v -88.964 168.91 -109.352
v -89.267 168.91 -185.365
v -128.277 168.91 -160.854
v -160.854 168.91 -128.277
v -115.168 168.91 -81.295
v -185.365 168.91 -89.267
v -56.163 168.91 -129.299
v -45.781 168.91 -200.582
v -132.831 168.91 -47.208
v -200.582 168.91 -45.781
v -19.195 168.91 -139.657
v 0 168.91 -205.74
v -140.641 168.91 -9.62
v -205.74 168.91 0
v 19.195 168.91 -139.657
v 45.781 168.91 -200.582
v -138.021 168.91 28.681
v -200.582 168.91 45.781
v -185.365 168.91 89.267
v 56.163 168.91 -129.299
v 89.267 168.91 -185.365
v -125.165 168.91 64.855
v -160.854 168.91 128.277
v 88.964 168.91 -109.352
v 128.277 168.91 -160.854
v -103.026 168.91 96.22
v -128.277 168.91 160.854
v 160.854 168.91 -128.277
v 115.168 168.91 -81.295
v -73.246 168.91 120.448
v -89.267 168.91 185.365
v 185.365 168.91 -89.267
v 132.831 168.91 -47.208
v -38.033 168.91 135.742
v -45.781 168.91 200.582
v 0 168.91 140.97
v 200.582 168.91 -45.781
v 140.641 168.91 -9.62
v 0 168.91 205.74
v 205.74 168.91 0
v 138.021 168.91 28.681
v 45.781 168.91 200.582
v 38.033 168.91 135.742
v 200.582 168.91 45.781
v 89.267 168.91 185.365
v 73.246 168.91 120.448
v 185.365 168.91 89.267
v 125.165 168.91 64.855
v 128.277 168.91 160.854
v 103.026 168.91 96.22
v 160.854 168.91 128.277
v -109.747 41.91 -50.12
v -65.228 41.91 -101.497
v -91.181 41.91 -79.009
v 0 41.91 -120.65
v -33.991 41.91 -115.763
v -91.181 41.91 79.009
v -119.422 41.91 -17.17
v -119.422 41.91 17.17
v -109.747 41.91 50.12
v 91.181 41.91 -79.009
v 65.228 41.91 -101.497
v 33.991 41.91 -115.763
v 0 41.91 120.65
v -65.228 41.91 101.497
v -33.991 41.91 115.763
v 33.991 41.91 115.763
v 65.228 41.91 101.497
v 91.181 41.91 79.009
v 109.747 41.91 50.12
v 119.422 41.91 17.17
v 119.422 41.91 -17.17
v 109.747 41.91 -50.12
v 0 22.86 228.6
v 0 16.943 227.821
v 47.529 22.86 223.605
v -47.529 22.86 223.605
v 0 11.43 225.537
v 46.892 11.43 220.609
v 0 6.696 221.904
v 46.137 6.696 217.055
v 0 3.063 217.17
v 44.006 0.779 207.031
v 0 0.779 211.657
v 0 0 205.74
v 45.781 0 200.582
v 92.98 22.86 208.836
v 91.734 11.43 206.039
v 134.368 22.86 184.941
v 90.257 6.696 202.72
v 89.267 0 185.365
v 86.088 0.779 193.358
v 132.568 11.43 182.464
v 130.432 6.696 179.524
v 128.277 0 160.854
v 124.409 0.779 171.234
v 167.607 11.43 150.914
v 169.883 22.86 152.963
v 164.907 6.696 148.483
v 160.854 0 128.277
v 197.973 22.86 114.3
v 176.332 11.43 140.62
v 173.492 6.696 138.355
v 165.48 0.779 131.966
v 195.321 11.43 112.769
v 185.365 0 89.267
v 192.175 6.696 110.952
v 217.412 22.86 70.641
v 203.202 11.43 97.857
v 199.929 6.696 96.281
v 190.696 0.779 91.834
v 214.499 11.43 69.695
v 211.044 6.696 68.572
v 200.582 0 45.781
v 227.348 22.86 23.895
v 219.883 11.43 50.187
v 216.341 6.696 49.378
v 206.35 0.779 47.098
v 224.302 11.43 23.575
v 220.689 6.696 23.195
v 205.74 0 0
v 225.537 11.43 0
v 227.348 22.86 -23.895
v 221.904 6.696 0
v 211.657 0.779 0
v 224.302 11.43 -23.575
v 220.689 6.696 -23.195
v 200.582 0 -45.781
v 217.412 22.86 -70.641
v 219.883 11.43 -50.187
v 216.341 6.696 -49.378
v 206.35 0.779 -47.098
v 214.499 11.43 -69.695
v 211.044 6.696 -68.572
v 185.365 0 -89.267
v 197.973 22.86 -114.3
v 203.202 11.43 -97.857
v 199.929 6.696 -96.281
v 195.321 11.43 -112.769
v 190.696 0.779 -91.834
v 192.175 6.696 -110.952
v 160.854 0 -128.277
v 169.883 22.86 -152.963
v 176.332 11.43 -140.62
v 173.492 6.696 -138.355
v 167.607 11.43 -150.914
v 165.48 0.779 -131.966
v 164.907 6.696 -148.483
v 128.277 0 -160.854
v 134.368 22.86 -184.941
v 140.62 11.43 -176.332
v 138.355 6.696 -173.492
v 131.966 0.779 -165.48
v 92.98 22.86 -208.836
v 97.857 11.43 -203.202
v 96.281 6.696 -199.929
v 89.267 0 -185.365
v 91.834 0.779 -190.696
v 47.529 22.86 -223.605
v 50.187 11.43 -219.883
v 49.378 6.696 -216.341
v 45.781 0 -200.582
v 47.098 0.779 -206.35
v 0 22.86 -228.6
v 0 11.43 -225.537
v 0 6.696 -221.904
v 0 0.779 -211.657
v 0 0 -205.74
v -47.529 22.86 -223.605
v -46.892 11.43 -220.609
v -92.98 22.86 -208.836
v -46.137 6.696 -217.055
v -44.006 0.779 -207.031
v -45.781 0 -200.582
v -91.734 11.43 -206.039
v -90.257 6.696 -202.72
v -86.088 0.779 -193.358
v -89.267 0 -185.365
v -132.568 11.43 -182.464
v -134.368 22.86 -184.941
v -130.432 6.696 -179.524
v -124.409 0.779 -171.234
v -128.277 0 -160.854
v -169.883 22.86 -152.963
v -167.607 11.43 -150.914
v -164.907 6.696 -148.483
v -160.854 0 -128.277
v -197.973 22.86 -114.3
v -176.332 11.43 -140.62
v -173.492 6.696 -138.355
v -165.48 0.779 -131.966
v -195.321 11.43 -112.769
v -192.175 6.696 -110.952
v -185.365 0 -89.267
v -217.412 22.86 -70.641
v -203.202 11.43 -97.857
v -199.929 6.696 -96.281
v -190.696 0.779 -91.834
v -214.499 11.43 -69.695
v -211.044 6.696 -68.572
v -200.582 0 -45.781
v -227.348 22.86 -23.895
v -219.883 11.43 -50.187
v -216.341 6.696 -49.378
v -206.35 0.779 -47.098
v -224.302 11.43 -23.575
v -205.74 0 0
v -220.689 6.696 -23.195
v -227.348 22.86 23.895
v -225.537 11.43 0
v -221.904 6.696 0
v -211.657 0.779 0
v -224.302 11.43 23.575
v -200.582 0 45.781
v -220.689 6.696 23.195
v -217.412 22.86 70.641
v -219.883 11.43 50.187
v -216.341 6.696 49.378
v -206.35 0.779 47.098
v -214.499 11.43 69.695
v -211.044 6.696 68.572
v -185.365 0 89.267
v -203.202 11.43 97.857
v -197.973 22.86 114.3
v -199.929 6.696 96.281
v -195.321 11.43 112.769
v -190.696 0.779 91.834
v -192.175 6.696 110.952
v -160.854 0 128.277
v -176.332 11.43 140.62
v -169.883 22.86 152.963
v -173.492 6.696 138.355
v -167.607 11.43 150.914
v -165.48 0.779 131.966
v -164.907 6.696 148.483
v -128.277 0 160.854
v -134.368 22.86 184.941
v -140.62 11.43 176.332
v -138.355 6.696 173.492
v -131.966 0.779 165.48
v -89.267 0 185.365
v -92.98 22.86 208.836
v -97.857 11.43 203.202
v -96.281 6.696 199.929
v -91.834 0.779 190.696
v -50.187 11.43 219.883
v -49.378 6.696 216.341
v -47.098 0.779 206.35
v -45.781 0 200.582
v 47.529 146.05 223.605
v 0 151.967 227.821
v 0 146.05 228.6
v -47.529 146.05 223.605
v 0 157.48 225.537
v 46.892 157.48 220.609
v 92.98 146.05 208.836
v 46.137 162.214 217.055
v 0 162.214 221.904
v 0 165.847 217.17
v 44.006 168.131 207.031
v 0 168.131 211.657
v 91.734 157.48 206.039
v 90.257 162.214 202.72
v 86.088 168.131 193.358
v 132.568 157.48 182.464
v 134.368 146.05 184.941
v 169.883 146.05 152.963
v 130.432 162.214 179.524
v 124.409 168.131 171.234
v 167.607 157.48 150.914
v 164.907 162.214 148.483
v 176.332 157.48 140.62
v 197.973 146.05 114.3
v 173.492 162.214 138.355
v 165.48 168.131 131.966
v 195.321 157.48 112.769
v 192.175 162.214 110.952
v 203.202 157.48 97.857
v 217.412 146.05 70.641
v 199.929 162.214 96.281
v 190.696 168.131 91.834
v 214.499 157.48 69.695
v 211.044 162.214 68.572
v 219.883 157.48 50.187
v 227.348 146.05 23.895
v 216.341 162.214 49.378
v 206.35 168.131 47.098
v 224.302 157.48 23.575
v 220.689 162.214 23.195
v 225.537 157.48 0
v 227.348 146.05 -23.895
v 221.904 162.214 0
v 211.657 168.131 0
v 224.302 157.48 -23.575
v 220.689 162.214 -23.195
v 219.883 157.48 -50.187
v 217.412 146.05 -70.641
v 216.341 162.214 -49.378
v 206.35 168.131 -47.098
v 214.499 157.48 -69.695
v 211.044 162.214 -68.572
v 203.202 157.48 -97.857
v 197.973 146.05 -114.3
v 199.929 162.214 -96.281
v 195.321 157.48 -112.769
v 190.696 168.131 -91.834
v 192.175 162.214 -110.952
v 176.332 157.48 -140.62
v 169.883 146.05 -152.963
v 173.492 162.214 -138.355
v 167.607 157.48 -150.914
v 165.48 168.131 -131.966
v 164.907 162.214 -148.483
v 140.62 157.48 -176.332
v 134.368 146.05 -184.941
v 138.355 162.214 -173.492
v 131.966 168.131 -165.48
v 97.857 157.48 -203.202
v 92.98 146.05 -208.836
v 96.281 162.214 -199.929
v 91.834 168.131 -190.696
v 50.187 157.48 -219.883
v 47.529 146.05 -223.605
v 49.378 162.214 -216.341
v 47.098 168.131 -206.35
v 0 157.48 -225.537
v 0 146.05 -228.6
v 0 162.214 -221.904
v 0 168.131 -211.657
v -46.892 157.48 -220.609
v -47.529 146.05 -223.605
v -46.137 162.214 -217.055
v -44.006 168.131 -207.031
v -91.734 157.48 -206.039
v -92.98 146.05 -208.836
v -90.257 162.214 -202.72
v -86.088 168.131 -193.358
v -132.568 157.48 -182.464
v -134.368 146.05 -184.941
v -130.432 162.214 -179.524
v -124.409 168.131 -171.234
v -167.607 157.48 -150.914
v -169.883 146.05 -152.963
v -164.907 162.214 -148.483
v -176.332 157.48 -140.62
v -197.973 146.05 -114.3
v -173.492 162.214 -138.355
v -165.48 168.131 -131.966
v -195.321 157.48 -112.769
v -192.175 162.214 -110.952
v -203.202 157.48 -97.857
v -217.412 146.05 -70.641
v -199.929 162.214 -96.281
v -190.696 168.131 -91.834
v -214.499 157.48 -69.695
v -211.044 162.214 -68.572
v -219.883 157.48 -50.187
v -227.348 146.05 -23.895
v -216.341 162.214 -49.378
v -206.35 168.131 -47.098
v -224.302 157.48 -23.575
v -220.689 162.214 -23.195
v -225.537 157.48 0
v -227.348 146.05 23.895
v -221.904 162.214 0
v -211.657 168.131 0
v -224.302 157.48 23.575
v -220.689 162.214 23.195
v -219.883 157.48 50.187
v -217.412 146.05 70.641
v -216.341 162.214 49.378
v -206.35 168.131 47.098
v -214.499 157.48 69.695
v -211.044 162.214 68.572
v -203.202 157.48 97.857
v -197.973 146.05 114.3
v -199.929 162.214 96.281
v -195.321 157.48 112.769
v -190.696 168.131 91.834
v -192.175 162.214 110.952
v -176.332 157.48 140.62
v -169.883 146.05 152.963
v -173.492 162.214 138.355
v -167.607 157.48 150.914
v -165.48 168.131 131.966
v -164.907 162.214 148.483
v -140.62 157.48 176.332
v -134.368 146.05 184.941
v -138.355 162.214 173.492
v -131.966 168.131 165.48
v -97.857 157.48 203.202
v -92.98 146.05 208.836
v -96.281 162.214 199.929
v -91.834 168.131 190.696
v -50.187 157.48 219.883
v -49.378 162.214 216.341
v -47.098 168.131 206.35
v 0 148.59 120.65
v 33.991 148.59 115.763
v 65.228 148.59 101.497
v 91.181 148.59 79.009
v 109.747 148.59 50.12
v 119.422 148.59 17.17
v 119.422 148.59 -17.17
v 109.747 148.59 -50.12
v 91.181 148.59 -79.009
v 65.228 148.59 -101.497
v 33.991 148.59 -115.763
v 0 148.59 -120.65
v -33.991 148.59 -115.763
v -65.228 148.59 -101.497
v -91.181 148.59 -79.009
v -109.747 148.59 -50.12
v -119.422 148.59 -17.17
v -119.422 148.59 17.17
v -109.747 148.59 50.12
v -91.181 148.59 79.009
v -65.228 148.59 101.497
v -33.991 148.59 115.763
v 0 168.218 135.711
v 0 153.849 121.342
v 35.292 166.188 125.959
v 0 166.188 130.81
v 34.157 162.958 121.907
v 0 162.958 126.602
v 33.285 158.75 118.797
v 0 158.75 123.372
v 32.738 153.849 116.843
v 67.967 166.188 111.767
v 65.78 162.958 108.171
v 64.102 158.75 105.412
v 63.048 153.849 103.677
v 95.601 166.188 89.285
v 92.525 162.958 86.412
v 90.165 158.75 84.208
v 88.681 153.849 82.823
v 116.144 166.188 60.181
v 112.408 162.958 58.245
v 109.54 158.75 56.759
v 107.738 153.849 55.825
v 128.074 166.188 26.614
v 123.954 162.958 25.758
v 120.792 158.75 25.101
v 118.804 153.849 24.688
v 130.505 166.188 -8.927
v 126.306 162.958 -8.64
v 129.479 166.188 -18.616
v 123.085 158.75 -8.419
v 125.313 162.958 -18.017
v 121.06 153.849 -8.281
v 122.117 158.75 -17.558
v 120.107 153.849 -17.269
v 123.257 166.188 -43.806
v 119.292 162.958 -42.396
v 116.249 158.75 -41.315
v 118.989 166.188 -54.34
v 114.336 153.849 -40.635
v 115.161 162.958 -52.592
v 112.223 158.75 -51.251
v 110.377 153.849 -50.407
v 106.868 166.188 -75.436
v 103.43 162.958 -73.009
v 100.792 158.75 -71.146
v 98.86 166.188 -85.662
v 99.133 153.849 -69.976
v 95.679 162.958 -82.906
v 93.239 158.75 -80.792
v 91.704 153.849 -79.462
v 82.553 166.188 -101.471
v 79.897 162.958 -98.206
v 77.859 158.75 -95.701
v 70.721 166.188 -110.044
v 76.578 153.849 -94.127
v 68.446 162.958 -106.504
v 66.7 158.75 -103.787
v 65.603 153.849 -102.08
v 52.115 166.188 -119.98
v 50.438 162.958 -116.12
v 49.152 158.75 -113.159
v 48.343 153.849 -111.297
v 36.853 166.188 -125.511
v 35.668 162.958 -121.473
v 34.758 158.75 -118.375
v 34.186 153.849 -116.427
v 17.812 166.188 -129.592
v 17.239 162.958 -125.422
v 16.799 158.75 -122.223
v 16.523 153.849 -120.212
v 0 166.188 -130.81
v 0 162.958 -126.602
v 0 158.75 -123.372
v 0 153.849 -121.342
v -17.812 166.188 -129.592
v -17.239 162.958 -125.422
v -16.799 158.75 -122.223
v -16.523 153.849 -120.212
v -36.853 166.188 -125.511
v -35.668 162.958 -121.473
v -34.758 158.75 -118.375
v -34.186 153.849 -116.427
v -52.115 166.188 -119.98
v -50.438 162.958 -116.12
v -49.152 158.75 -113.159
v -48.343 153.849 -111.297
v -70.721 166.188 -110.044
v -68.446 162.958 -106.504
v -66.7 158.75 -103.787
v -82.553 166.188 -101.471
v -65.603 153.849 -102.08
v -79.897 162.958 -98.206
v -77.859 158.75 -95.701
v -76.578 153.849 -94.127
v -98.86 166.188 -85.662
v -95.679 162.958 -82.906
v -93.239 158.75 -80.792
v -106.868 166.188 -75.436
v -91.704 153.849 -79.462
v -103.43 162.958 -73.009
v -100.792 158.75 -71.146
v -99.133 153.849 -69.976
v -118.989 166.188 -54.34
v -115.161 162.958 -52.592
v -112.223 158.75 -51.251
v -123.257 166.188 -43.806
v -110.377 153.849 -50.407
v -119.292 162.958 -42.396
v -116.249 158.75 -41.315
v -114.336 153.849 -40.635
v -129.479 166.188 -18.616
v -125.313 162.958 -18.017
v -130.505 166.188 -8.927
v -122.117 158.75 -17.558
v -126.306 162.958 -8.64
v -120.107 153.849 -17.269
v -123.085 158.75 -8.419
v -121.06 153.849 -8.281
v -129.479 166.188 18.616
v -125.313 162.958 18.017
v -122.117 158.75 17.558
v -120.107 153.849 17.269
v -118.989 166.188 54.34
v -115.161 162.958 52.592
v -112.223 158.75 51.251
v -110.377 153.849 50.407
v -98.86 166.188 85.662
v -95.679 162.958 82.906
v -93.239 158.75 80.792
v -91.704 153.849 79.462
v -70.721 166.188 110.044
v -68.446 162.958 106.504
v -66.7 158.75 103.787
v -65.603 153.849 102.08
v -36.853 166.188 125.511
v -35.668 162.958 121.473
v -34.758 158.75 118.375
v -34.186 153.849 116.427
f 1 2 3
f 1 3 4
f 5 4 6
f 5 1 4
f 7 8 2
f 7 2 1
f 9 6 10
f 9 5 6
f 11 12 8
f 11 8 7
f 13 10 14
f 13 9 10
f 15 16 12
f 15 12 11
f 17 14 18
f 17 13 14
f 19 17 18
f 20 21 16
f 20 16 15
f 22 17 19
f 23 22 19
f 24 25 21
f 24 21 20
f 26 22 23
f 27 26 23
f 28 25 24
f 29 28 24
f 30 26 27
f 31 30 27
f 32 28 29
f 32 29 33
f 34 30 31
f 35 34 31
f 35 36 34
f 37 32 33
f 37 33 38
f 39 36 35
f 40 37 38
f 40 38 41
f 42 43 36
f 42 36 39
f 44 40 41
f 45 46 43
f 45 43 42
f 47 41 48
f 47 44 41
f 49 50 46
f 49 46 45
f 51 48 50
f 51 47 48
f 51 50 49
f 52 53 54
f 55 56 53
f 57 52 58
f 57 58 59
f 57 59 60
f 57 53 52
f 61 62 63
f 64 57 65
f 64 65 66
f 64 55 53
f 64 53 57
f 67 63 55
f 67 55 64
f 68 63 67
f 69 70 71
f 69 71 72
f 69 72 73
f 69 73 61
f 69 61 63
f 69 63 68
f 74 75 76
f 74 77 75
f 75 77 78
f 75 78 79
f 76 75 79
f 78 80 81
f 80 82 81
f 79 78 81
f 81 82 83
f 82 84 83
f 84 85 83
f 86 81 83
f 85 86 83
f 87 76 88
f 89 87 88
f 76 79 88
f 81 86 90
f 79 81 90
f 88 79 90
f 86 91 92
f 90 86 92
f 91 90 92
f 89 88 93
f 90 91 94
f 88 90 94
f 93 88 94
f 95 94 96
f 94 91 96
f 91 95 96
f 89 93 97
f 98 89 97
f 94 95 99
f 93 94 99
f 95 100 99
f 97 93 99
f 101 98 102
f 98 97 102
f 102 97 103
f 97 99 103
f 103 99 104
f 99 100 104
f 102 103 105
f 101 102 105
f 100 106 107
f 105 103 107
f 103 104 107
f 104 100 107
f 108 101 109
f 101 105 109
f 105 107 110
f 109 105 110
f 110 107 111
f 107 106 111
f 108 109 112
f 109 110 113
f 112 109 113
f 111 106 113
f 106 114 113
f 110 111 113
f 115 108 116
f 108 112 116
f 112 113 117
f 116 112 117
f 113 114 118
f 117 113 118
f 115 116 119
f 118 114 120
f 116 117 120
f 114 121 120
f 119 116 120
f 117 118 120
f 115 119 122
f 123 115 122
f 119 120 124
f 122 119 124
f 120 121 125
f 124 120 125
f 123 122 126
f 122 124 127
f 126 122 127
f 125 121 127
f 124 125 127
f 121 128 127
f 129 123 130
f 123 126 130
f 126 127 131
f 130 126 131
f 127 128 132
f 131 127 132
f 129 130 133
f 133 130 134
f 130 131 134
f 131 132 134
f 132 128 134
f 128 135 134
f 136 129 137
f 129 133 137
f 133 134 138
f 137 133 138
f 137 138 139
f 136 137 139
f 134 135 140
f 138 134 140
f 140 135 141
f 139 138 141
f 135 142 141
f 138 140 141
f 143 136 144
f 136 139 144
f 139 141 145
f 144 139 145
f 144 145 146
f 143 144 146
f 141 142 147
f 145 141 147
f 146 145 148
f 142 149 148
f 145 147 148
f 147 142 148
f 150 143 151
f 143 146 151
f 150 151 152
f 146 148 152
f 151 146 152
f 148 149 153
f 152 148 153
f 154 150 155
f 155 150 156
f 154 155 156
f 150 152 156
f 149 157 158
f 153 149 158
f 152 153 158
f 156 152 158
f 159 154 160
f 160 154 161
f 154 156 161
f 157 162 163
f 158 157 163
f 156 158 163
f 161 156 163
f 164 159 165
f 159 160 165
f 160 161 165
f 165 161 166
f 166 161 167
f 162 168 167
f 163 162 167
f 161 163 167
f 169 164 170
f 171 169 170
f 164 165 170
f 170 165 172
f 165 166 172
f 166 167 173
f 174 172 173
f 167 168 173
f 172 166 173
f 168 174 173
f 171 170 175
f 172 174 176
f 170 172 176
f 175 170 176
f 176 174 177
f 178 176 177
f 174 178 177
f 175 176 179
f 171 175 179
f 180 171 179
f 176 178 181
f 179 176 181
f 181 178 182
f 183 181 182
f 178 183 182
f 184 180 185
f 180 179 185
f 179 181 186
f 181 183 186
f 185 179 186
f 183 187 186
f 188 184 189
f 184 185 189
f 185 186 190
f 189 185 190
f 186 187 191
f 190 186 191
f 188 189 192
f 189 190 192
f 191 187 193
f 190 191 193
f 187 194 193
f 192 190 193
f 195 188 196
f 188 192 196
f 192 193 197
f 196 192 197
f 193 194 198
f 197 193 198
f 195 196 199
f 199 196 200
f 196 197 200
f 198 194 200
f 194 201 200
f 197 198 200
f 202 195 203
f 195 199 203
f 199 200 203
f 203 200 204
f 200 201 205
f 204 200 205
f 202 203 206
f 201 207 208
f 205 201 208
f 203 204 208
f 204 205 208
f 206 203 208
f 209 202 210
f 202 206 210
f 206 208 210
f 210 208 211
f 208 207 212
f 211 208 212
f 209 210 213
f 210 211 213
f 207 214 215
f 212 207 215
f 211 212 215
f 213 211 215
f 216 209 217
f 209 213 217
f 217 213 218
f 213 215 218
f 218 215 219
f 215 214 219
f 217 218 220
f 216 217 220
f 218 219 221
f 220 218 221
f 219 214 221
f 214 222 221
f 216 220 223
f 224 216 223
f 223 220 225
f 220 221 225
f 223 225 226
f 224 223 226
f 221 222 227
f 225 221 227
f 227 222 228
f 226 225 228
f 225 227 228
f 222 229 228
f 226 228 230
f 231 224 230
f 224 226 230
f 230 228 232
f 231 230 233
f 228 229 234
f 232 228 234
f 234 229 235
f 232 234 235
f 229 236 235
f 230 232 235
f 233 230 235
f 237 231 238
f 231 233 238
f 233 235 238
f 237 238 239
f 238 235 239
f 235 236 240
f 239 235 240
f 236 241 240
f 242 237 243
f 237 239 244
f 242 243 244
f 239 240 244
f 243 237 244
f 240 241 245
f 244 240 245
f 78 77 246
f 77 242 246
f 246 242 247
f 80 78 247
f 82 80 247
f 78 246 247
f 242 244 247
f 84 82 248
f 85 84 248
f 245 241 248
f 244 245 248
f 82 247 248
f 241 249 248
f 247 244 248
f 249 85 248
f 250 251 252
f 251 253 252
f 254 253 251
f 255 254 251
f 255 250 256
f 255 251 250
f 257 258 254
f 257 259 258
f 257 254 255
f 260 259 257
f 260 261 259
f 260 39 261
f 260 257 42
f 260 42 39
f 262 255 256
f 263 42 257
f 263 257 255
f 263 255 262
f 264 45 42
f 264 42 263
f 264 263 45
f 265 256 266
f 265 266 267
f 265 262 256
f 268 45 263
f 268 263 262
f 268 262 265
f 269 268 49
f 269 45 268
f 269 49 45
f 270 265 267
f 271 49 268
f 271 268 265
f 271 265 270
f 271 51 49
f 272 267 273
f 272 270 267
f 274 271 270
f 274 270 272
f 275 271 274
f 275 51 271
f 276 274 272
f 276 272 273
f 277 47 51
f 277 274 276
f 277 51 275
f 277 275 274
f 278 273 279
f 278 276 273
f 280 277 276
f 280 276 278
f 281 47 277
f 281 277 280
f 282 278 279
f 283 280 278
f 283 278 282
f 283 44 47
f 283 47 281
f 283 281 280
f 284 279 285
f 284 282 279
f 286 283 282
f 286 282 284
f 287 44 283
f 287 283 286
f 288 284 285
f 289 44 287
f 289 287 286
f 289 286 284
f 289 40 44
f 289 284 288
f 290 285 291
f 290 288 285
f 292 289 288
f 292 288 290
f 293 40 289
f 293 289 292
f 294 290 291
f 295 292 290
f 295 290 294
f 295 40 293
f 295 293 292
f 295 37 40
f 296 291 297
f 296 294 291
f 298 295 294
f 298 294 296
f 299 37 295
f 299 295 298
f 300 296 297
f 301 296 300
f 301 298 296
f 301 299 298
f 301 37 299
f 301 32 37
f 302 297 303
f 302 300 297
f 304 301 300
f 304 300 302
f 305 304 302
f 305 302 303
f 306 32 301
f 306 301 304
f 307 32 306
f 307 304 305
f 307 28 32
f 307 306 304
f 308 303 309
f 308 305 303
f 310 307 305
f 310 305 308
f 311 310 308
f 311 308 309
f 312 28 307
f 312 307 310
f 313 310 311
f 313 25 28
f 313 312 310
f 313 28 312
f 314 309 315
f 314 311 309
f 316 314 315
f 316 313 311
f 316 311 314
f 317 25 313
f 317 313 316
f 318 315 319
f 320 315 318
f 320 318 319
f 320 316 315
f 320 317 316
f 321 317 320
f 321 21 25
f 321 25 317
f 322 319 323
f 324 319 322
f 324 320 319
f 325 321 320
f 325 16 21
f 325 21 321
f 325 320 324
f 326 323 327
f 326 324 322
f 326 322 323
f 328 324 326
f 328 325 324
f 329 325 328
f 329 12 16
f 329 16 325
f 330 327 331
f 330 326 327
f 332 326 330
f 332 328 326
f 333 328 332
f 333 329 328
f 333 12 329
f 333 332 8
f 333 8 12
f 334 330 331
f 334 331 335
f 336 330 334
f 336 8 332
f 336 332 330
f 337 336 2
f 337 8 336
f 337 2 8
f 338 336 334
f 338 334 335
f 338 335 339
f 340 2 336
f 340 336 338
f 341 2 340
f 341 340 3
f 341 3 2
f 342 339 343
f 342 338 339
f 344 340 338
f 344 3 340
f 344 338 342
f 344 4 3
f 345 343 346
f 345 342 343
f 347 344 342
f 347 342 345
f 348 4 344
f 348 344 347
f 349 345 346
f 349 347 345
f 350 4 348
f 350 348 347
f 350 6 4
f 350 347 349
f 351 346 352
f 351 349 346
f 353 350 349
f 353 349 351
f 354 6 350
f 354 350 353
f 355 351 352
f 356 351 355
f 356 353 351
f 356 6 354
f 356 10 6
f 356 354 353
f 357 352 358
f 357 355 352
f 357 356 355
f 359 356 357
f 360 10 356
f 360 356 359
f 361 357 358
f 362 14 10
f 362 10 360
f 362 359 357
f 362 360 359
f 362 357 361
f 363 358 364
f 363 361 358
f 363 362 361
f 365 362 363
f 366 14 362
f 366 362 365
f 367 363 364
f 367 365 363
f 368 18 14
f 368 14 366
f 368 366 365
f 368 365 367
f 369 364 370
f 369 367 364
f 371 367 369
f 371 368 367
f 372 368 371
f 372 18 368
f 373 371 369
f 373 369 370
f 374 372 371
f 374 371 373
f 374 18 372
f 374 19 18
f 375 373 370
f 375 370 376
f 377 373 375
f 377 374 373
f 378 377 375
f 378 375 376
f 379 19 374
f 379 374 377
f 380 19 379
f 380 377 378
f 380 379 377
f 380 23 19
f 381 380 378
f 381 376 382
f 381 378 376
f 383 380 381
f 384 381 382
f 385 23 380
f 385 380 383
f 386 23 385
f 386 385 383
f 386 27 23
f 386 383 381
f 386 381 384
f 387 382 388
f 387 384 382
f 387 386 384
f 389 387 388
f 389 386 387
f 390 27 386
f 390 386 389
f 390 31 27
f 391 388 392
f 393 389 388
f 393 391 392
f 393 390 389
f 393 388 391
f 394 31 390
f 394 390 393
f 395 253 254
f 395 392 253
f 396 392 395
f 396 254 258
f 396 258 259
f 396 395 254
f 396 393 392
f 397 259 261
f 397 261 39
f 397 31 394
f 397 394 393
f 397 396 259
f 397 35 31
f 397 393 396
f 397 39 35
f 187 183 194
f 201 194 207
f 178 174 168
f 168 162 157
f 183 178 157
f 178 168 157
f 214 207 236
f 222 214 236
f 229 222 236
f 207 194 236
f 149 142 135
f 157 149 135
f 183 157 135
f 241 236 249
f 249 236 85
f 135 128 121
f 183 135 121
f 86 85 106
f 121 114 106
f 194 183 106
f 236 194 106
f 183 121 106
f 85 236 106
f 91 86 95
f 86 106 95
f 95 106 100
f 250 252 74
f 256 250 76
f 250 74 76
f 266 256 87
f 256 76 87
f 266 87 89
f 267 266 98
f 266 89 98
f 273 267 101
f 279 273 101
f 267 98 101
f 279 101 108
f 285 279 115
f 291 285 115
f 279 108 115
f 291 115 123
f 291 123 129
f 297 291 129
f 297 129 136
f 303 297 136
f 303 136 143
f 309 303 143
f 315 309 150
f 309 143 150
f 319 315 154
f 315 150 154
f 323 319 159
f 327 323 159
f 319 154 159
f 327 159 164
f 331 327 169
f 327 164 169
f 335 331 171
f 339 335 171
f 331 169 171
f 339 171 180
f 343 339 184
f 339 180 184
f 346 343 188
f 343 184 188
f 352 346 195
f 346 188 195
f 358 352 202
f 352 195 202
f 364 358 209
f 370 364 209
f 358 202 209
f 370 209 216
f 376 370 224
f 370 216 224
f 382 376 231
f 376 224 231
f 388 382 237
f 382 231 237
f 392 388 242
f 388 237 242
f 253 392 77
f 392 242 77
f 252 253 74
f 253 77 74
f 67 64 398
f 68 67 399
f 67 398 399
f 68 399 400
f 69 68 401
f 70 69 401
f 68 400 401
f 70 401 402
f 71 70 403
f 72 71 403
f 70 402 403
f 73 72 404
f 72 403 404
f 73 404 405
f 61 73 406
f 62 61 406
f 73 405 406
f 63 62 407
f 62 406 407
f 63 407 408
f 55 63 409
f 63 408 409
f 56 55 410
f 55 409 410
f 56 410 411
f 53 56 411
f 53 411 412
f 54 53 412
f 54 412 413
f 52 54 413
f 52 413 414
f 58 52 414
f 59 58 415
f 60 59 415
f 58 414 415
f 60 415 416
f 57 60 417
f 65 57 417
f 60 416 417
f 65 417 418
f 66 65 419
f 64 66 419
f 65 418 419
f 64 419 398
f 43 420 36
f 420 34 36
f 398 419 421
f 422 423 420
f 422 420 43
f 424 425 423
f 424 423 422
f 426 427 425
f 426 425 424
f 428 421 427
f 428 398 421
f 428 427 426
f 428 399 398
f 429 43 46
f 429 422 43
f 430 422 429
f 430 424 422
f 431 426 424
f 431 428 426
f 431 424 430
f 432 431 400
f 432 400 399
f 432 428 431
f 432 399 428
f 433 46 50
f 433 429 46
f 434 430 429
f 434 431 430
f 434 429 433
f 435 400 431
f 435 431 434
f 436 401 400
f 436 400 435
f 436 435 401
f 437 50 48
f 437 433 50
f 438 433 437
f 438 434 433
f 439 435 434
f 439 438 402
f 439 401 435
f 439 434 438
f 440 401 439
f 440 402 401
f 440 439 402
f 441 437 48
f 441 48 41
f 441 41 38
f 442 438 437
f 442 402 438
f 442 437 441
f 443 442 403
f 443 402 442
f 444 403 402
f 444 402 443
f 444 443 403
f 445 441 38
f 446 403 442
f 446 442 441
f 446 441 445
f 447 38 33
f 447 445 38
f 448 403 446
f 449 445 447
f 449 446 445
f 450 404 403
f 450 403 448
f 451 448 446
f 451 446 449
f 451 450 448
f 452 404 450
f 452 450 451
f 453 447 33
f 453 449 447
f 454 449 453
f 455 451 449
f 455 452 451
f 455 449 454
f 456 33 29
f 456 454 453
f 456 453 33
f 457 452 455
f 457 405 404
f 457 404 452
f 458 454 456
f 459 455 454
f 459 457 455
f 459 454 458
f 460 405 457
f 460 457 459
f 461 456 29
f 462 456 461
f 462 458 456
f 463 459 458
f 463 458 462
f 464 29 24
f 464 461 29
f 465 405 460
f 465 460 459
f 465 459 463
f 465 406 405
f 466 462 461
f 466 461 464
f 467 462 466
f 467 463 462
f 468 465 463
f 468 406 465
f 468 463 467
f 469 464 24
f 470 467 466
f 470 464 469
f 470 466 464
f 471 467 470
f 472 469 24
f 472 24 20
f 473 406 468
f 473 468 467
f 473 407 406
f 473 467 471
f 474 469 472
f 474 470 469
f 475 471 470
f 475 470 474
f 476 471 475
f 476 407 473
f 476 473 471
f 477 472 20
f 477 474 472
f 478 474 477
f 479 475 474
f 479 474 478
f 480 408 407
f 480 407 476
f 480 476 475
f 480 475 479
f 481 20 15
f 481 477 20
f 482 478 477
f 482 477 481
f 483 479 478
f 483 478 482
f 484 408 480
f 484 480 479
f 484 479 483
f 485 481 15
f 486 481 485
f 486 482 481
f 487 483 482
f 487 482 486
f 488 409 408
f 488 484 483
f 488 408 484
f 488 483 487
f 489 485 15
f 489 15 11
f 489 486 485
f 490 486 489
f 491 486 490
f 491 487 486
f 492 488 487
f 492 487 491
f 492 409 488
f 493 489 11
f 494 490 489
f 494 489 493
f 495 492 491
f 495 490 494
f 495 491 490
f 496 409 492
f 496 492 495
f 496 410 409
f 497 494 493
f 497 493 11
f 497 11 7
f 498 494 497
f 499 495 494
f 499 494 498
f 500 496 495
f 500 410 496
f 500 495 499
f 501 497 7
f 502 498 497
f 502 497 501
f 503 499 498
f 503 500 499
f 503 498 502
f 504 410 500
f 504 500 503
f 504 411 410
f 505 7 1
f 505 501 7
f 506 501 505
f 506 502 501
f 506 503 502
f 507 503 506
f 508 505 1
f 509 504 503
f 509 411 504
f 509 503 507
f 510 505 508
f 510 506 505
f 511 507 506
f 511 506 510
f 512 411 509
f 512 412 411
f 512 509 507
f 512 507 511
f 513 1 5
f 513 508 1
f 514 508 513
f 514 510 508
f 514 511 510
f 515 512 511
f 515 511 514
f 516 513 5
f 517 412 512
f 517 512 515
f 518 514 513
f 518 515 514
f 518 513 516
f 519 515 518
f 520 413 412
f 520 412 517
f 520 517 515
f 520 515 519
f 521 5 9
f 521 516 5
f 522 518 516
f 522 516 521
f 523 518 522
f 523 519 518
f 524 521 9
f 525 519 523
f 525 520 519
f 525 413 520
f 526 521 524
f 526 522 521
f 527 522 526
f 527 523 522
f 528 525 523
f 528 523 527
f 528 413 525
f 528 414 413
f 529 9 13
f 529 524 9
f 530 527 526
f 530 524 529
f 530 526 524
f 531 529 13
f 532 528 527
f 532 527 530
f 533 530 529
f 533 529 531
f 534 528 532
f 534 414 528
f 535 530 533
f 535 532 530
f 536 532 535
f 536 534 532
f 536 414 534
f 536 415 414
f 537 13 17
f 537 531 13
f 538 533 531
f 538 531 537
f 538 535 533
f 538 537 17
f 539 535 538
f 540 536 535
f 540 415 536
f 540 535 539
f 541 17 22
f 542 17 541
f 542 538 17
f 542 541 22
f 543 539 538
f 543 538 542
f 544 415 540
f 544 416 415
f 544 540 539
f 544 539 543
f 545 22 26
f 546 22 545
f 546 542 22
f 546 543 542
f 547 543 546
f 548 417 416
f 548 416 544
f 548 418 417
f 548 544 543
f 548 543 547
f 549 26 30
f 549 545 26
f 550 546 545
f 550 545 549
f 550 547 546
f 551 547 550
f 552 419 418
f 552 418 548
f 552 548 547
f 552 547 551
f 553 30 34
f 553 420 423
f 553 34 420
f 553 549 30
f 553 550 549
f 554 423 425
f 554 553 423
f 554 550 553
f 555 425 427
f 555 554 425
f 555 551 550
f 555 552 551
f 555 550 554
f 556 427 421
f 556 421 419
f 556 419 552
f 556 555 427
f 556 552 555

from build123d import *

# Parameters (mm, degrees)
SKETCH1_R           = 228.6
BOSS_EXTRUDE1_DEPTH = 168.91
FILLET1_R           = 22.86
SKETCH2_R           = 120.65
CUT_EXTRUDE1_DEPTH  = 127
FILLET2_R           = 20.32


with BuildPart() as part:
    # Sketch1 → Boss-Extrude1 (new body)
    with BuildSketch(Plane(origin=(0, 0, 0), x_dir=(1, 0, 0), z_dir=(0, 1, 0))):
        with Locations(Location((0, 0, 0), (0, 0, 270))):
            Circle(SKETCH1_R)
    extrude(amount=BOSS_EXTRUDE1_DEPTH)

    # Fillet1
    fillet1_edges = [part.edges().sort_by_distance(p)[0] for p in [
        (0, 0, -228.6),
        (0, 168.91, -228.6),
    ]]
    fillet(fillet1_edges, radius=FILLET1_R)

    # Sketch2 → Cut-Extrude1 (cut)
    with BuildSketch(Plane(origin=(0, 168.91, 0), x_dir=(1, 0, 0), z_dir=(0, 1, 0))):
        with Locations(Location((0, 0, 0), (0, 0, 270))):
            Circle(SKETCH2_R)
    extrude(amount=-CUT_EXTRUDE1_DEPTH, mode=Mode.SUBTRACT)

    # Fillet2
    fillet2_edges = [part.edges().sort_by_distance(p)[0] for p in [
        (0, 168.91, -120.65),
    ]]
    fillet(fillet2_edges, radius=FILLET2_R)


solid = part.part
